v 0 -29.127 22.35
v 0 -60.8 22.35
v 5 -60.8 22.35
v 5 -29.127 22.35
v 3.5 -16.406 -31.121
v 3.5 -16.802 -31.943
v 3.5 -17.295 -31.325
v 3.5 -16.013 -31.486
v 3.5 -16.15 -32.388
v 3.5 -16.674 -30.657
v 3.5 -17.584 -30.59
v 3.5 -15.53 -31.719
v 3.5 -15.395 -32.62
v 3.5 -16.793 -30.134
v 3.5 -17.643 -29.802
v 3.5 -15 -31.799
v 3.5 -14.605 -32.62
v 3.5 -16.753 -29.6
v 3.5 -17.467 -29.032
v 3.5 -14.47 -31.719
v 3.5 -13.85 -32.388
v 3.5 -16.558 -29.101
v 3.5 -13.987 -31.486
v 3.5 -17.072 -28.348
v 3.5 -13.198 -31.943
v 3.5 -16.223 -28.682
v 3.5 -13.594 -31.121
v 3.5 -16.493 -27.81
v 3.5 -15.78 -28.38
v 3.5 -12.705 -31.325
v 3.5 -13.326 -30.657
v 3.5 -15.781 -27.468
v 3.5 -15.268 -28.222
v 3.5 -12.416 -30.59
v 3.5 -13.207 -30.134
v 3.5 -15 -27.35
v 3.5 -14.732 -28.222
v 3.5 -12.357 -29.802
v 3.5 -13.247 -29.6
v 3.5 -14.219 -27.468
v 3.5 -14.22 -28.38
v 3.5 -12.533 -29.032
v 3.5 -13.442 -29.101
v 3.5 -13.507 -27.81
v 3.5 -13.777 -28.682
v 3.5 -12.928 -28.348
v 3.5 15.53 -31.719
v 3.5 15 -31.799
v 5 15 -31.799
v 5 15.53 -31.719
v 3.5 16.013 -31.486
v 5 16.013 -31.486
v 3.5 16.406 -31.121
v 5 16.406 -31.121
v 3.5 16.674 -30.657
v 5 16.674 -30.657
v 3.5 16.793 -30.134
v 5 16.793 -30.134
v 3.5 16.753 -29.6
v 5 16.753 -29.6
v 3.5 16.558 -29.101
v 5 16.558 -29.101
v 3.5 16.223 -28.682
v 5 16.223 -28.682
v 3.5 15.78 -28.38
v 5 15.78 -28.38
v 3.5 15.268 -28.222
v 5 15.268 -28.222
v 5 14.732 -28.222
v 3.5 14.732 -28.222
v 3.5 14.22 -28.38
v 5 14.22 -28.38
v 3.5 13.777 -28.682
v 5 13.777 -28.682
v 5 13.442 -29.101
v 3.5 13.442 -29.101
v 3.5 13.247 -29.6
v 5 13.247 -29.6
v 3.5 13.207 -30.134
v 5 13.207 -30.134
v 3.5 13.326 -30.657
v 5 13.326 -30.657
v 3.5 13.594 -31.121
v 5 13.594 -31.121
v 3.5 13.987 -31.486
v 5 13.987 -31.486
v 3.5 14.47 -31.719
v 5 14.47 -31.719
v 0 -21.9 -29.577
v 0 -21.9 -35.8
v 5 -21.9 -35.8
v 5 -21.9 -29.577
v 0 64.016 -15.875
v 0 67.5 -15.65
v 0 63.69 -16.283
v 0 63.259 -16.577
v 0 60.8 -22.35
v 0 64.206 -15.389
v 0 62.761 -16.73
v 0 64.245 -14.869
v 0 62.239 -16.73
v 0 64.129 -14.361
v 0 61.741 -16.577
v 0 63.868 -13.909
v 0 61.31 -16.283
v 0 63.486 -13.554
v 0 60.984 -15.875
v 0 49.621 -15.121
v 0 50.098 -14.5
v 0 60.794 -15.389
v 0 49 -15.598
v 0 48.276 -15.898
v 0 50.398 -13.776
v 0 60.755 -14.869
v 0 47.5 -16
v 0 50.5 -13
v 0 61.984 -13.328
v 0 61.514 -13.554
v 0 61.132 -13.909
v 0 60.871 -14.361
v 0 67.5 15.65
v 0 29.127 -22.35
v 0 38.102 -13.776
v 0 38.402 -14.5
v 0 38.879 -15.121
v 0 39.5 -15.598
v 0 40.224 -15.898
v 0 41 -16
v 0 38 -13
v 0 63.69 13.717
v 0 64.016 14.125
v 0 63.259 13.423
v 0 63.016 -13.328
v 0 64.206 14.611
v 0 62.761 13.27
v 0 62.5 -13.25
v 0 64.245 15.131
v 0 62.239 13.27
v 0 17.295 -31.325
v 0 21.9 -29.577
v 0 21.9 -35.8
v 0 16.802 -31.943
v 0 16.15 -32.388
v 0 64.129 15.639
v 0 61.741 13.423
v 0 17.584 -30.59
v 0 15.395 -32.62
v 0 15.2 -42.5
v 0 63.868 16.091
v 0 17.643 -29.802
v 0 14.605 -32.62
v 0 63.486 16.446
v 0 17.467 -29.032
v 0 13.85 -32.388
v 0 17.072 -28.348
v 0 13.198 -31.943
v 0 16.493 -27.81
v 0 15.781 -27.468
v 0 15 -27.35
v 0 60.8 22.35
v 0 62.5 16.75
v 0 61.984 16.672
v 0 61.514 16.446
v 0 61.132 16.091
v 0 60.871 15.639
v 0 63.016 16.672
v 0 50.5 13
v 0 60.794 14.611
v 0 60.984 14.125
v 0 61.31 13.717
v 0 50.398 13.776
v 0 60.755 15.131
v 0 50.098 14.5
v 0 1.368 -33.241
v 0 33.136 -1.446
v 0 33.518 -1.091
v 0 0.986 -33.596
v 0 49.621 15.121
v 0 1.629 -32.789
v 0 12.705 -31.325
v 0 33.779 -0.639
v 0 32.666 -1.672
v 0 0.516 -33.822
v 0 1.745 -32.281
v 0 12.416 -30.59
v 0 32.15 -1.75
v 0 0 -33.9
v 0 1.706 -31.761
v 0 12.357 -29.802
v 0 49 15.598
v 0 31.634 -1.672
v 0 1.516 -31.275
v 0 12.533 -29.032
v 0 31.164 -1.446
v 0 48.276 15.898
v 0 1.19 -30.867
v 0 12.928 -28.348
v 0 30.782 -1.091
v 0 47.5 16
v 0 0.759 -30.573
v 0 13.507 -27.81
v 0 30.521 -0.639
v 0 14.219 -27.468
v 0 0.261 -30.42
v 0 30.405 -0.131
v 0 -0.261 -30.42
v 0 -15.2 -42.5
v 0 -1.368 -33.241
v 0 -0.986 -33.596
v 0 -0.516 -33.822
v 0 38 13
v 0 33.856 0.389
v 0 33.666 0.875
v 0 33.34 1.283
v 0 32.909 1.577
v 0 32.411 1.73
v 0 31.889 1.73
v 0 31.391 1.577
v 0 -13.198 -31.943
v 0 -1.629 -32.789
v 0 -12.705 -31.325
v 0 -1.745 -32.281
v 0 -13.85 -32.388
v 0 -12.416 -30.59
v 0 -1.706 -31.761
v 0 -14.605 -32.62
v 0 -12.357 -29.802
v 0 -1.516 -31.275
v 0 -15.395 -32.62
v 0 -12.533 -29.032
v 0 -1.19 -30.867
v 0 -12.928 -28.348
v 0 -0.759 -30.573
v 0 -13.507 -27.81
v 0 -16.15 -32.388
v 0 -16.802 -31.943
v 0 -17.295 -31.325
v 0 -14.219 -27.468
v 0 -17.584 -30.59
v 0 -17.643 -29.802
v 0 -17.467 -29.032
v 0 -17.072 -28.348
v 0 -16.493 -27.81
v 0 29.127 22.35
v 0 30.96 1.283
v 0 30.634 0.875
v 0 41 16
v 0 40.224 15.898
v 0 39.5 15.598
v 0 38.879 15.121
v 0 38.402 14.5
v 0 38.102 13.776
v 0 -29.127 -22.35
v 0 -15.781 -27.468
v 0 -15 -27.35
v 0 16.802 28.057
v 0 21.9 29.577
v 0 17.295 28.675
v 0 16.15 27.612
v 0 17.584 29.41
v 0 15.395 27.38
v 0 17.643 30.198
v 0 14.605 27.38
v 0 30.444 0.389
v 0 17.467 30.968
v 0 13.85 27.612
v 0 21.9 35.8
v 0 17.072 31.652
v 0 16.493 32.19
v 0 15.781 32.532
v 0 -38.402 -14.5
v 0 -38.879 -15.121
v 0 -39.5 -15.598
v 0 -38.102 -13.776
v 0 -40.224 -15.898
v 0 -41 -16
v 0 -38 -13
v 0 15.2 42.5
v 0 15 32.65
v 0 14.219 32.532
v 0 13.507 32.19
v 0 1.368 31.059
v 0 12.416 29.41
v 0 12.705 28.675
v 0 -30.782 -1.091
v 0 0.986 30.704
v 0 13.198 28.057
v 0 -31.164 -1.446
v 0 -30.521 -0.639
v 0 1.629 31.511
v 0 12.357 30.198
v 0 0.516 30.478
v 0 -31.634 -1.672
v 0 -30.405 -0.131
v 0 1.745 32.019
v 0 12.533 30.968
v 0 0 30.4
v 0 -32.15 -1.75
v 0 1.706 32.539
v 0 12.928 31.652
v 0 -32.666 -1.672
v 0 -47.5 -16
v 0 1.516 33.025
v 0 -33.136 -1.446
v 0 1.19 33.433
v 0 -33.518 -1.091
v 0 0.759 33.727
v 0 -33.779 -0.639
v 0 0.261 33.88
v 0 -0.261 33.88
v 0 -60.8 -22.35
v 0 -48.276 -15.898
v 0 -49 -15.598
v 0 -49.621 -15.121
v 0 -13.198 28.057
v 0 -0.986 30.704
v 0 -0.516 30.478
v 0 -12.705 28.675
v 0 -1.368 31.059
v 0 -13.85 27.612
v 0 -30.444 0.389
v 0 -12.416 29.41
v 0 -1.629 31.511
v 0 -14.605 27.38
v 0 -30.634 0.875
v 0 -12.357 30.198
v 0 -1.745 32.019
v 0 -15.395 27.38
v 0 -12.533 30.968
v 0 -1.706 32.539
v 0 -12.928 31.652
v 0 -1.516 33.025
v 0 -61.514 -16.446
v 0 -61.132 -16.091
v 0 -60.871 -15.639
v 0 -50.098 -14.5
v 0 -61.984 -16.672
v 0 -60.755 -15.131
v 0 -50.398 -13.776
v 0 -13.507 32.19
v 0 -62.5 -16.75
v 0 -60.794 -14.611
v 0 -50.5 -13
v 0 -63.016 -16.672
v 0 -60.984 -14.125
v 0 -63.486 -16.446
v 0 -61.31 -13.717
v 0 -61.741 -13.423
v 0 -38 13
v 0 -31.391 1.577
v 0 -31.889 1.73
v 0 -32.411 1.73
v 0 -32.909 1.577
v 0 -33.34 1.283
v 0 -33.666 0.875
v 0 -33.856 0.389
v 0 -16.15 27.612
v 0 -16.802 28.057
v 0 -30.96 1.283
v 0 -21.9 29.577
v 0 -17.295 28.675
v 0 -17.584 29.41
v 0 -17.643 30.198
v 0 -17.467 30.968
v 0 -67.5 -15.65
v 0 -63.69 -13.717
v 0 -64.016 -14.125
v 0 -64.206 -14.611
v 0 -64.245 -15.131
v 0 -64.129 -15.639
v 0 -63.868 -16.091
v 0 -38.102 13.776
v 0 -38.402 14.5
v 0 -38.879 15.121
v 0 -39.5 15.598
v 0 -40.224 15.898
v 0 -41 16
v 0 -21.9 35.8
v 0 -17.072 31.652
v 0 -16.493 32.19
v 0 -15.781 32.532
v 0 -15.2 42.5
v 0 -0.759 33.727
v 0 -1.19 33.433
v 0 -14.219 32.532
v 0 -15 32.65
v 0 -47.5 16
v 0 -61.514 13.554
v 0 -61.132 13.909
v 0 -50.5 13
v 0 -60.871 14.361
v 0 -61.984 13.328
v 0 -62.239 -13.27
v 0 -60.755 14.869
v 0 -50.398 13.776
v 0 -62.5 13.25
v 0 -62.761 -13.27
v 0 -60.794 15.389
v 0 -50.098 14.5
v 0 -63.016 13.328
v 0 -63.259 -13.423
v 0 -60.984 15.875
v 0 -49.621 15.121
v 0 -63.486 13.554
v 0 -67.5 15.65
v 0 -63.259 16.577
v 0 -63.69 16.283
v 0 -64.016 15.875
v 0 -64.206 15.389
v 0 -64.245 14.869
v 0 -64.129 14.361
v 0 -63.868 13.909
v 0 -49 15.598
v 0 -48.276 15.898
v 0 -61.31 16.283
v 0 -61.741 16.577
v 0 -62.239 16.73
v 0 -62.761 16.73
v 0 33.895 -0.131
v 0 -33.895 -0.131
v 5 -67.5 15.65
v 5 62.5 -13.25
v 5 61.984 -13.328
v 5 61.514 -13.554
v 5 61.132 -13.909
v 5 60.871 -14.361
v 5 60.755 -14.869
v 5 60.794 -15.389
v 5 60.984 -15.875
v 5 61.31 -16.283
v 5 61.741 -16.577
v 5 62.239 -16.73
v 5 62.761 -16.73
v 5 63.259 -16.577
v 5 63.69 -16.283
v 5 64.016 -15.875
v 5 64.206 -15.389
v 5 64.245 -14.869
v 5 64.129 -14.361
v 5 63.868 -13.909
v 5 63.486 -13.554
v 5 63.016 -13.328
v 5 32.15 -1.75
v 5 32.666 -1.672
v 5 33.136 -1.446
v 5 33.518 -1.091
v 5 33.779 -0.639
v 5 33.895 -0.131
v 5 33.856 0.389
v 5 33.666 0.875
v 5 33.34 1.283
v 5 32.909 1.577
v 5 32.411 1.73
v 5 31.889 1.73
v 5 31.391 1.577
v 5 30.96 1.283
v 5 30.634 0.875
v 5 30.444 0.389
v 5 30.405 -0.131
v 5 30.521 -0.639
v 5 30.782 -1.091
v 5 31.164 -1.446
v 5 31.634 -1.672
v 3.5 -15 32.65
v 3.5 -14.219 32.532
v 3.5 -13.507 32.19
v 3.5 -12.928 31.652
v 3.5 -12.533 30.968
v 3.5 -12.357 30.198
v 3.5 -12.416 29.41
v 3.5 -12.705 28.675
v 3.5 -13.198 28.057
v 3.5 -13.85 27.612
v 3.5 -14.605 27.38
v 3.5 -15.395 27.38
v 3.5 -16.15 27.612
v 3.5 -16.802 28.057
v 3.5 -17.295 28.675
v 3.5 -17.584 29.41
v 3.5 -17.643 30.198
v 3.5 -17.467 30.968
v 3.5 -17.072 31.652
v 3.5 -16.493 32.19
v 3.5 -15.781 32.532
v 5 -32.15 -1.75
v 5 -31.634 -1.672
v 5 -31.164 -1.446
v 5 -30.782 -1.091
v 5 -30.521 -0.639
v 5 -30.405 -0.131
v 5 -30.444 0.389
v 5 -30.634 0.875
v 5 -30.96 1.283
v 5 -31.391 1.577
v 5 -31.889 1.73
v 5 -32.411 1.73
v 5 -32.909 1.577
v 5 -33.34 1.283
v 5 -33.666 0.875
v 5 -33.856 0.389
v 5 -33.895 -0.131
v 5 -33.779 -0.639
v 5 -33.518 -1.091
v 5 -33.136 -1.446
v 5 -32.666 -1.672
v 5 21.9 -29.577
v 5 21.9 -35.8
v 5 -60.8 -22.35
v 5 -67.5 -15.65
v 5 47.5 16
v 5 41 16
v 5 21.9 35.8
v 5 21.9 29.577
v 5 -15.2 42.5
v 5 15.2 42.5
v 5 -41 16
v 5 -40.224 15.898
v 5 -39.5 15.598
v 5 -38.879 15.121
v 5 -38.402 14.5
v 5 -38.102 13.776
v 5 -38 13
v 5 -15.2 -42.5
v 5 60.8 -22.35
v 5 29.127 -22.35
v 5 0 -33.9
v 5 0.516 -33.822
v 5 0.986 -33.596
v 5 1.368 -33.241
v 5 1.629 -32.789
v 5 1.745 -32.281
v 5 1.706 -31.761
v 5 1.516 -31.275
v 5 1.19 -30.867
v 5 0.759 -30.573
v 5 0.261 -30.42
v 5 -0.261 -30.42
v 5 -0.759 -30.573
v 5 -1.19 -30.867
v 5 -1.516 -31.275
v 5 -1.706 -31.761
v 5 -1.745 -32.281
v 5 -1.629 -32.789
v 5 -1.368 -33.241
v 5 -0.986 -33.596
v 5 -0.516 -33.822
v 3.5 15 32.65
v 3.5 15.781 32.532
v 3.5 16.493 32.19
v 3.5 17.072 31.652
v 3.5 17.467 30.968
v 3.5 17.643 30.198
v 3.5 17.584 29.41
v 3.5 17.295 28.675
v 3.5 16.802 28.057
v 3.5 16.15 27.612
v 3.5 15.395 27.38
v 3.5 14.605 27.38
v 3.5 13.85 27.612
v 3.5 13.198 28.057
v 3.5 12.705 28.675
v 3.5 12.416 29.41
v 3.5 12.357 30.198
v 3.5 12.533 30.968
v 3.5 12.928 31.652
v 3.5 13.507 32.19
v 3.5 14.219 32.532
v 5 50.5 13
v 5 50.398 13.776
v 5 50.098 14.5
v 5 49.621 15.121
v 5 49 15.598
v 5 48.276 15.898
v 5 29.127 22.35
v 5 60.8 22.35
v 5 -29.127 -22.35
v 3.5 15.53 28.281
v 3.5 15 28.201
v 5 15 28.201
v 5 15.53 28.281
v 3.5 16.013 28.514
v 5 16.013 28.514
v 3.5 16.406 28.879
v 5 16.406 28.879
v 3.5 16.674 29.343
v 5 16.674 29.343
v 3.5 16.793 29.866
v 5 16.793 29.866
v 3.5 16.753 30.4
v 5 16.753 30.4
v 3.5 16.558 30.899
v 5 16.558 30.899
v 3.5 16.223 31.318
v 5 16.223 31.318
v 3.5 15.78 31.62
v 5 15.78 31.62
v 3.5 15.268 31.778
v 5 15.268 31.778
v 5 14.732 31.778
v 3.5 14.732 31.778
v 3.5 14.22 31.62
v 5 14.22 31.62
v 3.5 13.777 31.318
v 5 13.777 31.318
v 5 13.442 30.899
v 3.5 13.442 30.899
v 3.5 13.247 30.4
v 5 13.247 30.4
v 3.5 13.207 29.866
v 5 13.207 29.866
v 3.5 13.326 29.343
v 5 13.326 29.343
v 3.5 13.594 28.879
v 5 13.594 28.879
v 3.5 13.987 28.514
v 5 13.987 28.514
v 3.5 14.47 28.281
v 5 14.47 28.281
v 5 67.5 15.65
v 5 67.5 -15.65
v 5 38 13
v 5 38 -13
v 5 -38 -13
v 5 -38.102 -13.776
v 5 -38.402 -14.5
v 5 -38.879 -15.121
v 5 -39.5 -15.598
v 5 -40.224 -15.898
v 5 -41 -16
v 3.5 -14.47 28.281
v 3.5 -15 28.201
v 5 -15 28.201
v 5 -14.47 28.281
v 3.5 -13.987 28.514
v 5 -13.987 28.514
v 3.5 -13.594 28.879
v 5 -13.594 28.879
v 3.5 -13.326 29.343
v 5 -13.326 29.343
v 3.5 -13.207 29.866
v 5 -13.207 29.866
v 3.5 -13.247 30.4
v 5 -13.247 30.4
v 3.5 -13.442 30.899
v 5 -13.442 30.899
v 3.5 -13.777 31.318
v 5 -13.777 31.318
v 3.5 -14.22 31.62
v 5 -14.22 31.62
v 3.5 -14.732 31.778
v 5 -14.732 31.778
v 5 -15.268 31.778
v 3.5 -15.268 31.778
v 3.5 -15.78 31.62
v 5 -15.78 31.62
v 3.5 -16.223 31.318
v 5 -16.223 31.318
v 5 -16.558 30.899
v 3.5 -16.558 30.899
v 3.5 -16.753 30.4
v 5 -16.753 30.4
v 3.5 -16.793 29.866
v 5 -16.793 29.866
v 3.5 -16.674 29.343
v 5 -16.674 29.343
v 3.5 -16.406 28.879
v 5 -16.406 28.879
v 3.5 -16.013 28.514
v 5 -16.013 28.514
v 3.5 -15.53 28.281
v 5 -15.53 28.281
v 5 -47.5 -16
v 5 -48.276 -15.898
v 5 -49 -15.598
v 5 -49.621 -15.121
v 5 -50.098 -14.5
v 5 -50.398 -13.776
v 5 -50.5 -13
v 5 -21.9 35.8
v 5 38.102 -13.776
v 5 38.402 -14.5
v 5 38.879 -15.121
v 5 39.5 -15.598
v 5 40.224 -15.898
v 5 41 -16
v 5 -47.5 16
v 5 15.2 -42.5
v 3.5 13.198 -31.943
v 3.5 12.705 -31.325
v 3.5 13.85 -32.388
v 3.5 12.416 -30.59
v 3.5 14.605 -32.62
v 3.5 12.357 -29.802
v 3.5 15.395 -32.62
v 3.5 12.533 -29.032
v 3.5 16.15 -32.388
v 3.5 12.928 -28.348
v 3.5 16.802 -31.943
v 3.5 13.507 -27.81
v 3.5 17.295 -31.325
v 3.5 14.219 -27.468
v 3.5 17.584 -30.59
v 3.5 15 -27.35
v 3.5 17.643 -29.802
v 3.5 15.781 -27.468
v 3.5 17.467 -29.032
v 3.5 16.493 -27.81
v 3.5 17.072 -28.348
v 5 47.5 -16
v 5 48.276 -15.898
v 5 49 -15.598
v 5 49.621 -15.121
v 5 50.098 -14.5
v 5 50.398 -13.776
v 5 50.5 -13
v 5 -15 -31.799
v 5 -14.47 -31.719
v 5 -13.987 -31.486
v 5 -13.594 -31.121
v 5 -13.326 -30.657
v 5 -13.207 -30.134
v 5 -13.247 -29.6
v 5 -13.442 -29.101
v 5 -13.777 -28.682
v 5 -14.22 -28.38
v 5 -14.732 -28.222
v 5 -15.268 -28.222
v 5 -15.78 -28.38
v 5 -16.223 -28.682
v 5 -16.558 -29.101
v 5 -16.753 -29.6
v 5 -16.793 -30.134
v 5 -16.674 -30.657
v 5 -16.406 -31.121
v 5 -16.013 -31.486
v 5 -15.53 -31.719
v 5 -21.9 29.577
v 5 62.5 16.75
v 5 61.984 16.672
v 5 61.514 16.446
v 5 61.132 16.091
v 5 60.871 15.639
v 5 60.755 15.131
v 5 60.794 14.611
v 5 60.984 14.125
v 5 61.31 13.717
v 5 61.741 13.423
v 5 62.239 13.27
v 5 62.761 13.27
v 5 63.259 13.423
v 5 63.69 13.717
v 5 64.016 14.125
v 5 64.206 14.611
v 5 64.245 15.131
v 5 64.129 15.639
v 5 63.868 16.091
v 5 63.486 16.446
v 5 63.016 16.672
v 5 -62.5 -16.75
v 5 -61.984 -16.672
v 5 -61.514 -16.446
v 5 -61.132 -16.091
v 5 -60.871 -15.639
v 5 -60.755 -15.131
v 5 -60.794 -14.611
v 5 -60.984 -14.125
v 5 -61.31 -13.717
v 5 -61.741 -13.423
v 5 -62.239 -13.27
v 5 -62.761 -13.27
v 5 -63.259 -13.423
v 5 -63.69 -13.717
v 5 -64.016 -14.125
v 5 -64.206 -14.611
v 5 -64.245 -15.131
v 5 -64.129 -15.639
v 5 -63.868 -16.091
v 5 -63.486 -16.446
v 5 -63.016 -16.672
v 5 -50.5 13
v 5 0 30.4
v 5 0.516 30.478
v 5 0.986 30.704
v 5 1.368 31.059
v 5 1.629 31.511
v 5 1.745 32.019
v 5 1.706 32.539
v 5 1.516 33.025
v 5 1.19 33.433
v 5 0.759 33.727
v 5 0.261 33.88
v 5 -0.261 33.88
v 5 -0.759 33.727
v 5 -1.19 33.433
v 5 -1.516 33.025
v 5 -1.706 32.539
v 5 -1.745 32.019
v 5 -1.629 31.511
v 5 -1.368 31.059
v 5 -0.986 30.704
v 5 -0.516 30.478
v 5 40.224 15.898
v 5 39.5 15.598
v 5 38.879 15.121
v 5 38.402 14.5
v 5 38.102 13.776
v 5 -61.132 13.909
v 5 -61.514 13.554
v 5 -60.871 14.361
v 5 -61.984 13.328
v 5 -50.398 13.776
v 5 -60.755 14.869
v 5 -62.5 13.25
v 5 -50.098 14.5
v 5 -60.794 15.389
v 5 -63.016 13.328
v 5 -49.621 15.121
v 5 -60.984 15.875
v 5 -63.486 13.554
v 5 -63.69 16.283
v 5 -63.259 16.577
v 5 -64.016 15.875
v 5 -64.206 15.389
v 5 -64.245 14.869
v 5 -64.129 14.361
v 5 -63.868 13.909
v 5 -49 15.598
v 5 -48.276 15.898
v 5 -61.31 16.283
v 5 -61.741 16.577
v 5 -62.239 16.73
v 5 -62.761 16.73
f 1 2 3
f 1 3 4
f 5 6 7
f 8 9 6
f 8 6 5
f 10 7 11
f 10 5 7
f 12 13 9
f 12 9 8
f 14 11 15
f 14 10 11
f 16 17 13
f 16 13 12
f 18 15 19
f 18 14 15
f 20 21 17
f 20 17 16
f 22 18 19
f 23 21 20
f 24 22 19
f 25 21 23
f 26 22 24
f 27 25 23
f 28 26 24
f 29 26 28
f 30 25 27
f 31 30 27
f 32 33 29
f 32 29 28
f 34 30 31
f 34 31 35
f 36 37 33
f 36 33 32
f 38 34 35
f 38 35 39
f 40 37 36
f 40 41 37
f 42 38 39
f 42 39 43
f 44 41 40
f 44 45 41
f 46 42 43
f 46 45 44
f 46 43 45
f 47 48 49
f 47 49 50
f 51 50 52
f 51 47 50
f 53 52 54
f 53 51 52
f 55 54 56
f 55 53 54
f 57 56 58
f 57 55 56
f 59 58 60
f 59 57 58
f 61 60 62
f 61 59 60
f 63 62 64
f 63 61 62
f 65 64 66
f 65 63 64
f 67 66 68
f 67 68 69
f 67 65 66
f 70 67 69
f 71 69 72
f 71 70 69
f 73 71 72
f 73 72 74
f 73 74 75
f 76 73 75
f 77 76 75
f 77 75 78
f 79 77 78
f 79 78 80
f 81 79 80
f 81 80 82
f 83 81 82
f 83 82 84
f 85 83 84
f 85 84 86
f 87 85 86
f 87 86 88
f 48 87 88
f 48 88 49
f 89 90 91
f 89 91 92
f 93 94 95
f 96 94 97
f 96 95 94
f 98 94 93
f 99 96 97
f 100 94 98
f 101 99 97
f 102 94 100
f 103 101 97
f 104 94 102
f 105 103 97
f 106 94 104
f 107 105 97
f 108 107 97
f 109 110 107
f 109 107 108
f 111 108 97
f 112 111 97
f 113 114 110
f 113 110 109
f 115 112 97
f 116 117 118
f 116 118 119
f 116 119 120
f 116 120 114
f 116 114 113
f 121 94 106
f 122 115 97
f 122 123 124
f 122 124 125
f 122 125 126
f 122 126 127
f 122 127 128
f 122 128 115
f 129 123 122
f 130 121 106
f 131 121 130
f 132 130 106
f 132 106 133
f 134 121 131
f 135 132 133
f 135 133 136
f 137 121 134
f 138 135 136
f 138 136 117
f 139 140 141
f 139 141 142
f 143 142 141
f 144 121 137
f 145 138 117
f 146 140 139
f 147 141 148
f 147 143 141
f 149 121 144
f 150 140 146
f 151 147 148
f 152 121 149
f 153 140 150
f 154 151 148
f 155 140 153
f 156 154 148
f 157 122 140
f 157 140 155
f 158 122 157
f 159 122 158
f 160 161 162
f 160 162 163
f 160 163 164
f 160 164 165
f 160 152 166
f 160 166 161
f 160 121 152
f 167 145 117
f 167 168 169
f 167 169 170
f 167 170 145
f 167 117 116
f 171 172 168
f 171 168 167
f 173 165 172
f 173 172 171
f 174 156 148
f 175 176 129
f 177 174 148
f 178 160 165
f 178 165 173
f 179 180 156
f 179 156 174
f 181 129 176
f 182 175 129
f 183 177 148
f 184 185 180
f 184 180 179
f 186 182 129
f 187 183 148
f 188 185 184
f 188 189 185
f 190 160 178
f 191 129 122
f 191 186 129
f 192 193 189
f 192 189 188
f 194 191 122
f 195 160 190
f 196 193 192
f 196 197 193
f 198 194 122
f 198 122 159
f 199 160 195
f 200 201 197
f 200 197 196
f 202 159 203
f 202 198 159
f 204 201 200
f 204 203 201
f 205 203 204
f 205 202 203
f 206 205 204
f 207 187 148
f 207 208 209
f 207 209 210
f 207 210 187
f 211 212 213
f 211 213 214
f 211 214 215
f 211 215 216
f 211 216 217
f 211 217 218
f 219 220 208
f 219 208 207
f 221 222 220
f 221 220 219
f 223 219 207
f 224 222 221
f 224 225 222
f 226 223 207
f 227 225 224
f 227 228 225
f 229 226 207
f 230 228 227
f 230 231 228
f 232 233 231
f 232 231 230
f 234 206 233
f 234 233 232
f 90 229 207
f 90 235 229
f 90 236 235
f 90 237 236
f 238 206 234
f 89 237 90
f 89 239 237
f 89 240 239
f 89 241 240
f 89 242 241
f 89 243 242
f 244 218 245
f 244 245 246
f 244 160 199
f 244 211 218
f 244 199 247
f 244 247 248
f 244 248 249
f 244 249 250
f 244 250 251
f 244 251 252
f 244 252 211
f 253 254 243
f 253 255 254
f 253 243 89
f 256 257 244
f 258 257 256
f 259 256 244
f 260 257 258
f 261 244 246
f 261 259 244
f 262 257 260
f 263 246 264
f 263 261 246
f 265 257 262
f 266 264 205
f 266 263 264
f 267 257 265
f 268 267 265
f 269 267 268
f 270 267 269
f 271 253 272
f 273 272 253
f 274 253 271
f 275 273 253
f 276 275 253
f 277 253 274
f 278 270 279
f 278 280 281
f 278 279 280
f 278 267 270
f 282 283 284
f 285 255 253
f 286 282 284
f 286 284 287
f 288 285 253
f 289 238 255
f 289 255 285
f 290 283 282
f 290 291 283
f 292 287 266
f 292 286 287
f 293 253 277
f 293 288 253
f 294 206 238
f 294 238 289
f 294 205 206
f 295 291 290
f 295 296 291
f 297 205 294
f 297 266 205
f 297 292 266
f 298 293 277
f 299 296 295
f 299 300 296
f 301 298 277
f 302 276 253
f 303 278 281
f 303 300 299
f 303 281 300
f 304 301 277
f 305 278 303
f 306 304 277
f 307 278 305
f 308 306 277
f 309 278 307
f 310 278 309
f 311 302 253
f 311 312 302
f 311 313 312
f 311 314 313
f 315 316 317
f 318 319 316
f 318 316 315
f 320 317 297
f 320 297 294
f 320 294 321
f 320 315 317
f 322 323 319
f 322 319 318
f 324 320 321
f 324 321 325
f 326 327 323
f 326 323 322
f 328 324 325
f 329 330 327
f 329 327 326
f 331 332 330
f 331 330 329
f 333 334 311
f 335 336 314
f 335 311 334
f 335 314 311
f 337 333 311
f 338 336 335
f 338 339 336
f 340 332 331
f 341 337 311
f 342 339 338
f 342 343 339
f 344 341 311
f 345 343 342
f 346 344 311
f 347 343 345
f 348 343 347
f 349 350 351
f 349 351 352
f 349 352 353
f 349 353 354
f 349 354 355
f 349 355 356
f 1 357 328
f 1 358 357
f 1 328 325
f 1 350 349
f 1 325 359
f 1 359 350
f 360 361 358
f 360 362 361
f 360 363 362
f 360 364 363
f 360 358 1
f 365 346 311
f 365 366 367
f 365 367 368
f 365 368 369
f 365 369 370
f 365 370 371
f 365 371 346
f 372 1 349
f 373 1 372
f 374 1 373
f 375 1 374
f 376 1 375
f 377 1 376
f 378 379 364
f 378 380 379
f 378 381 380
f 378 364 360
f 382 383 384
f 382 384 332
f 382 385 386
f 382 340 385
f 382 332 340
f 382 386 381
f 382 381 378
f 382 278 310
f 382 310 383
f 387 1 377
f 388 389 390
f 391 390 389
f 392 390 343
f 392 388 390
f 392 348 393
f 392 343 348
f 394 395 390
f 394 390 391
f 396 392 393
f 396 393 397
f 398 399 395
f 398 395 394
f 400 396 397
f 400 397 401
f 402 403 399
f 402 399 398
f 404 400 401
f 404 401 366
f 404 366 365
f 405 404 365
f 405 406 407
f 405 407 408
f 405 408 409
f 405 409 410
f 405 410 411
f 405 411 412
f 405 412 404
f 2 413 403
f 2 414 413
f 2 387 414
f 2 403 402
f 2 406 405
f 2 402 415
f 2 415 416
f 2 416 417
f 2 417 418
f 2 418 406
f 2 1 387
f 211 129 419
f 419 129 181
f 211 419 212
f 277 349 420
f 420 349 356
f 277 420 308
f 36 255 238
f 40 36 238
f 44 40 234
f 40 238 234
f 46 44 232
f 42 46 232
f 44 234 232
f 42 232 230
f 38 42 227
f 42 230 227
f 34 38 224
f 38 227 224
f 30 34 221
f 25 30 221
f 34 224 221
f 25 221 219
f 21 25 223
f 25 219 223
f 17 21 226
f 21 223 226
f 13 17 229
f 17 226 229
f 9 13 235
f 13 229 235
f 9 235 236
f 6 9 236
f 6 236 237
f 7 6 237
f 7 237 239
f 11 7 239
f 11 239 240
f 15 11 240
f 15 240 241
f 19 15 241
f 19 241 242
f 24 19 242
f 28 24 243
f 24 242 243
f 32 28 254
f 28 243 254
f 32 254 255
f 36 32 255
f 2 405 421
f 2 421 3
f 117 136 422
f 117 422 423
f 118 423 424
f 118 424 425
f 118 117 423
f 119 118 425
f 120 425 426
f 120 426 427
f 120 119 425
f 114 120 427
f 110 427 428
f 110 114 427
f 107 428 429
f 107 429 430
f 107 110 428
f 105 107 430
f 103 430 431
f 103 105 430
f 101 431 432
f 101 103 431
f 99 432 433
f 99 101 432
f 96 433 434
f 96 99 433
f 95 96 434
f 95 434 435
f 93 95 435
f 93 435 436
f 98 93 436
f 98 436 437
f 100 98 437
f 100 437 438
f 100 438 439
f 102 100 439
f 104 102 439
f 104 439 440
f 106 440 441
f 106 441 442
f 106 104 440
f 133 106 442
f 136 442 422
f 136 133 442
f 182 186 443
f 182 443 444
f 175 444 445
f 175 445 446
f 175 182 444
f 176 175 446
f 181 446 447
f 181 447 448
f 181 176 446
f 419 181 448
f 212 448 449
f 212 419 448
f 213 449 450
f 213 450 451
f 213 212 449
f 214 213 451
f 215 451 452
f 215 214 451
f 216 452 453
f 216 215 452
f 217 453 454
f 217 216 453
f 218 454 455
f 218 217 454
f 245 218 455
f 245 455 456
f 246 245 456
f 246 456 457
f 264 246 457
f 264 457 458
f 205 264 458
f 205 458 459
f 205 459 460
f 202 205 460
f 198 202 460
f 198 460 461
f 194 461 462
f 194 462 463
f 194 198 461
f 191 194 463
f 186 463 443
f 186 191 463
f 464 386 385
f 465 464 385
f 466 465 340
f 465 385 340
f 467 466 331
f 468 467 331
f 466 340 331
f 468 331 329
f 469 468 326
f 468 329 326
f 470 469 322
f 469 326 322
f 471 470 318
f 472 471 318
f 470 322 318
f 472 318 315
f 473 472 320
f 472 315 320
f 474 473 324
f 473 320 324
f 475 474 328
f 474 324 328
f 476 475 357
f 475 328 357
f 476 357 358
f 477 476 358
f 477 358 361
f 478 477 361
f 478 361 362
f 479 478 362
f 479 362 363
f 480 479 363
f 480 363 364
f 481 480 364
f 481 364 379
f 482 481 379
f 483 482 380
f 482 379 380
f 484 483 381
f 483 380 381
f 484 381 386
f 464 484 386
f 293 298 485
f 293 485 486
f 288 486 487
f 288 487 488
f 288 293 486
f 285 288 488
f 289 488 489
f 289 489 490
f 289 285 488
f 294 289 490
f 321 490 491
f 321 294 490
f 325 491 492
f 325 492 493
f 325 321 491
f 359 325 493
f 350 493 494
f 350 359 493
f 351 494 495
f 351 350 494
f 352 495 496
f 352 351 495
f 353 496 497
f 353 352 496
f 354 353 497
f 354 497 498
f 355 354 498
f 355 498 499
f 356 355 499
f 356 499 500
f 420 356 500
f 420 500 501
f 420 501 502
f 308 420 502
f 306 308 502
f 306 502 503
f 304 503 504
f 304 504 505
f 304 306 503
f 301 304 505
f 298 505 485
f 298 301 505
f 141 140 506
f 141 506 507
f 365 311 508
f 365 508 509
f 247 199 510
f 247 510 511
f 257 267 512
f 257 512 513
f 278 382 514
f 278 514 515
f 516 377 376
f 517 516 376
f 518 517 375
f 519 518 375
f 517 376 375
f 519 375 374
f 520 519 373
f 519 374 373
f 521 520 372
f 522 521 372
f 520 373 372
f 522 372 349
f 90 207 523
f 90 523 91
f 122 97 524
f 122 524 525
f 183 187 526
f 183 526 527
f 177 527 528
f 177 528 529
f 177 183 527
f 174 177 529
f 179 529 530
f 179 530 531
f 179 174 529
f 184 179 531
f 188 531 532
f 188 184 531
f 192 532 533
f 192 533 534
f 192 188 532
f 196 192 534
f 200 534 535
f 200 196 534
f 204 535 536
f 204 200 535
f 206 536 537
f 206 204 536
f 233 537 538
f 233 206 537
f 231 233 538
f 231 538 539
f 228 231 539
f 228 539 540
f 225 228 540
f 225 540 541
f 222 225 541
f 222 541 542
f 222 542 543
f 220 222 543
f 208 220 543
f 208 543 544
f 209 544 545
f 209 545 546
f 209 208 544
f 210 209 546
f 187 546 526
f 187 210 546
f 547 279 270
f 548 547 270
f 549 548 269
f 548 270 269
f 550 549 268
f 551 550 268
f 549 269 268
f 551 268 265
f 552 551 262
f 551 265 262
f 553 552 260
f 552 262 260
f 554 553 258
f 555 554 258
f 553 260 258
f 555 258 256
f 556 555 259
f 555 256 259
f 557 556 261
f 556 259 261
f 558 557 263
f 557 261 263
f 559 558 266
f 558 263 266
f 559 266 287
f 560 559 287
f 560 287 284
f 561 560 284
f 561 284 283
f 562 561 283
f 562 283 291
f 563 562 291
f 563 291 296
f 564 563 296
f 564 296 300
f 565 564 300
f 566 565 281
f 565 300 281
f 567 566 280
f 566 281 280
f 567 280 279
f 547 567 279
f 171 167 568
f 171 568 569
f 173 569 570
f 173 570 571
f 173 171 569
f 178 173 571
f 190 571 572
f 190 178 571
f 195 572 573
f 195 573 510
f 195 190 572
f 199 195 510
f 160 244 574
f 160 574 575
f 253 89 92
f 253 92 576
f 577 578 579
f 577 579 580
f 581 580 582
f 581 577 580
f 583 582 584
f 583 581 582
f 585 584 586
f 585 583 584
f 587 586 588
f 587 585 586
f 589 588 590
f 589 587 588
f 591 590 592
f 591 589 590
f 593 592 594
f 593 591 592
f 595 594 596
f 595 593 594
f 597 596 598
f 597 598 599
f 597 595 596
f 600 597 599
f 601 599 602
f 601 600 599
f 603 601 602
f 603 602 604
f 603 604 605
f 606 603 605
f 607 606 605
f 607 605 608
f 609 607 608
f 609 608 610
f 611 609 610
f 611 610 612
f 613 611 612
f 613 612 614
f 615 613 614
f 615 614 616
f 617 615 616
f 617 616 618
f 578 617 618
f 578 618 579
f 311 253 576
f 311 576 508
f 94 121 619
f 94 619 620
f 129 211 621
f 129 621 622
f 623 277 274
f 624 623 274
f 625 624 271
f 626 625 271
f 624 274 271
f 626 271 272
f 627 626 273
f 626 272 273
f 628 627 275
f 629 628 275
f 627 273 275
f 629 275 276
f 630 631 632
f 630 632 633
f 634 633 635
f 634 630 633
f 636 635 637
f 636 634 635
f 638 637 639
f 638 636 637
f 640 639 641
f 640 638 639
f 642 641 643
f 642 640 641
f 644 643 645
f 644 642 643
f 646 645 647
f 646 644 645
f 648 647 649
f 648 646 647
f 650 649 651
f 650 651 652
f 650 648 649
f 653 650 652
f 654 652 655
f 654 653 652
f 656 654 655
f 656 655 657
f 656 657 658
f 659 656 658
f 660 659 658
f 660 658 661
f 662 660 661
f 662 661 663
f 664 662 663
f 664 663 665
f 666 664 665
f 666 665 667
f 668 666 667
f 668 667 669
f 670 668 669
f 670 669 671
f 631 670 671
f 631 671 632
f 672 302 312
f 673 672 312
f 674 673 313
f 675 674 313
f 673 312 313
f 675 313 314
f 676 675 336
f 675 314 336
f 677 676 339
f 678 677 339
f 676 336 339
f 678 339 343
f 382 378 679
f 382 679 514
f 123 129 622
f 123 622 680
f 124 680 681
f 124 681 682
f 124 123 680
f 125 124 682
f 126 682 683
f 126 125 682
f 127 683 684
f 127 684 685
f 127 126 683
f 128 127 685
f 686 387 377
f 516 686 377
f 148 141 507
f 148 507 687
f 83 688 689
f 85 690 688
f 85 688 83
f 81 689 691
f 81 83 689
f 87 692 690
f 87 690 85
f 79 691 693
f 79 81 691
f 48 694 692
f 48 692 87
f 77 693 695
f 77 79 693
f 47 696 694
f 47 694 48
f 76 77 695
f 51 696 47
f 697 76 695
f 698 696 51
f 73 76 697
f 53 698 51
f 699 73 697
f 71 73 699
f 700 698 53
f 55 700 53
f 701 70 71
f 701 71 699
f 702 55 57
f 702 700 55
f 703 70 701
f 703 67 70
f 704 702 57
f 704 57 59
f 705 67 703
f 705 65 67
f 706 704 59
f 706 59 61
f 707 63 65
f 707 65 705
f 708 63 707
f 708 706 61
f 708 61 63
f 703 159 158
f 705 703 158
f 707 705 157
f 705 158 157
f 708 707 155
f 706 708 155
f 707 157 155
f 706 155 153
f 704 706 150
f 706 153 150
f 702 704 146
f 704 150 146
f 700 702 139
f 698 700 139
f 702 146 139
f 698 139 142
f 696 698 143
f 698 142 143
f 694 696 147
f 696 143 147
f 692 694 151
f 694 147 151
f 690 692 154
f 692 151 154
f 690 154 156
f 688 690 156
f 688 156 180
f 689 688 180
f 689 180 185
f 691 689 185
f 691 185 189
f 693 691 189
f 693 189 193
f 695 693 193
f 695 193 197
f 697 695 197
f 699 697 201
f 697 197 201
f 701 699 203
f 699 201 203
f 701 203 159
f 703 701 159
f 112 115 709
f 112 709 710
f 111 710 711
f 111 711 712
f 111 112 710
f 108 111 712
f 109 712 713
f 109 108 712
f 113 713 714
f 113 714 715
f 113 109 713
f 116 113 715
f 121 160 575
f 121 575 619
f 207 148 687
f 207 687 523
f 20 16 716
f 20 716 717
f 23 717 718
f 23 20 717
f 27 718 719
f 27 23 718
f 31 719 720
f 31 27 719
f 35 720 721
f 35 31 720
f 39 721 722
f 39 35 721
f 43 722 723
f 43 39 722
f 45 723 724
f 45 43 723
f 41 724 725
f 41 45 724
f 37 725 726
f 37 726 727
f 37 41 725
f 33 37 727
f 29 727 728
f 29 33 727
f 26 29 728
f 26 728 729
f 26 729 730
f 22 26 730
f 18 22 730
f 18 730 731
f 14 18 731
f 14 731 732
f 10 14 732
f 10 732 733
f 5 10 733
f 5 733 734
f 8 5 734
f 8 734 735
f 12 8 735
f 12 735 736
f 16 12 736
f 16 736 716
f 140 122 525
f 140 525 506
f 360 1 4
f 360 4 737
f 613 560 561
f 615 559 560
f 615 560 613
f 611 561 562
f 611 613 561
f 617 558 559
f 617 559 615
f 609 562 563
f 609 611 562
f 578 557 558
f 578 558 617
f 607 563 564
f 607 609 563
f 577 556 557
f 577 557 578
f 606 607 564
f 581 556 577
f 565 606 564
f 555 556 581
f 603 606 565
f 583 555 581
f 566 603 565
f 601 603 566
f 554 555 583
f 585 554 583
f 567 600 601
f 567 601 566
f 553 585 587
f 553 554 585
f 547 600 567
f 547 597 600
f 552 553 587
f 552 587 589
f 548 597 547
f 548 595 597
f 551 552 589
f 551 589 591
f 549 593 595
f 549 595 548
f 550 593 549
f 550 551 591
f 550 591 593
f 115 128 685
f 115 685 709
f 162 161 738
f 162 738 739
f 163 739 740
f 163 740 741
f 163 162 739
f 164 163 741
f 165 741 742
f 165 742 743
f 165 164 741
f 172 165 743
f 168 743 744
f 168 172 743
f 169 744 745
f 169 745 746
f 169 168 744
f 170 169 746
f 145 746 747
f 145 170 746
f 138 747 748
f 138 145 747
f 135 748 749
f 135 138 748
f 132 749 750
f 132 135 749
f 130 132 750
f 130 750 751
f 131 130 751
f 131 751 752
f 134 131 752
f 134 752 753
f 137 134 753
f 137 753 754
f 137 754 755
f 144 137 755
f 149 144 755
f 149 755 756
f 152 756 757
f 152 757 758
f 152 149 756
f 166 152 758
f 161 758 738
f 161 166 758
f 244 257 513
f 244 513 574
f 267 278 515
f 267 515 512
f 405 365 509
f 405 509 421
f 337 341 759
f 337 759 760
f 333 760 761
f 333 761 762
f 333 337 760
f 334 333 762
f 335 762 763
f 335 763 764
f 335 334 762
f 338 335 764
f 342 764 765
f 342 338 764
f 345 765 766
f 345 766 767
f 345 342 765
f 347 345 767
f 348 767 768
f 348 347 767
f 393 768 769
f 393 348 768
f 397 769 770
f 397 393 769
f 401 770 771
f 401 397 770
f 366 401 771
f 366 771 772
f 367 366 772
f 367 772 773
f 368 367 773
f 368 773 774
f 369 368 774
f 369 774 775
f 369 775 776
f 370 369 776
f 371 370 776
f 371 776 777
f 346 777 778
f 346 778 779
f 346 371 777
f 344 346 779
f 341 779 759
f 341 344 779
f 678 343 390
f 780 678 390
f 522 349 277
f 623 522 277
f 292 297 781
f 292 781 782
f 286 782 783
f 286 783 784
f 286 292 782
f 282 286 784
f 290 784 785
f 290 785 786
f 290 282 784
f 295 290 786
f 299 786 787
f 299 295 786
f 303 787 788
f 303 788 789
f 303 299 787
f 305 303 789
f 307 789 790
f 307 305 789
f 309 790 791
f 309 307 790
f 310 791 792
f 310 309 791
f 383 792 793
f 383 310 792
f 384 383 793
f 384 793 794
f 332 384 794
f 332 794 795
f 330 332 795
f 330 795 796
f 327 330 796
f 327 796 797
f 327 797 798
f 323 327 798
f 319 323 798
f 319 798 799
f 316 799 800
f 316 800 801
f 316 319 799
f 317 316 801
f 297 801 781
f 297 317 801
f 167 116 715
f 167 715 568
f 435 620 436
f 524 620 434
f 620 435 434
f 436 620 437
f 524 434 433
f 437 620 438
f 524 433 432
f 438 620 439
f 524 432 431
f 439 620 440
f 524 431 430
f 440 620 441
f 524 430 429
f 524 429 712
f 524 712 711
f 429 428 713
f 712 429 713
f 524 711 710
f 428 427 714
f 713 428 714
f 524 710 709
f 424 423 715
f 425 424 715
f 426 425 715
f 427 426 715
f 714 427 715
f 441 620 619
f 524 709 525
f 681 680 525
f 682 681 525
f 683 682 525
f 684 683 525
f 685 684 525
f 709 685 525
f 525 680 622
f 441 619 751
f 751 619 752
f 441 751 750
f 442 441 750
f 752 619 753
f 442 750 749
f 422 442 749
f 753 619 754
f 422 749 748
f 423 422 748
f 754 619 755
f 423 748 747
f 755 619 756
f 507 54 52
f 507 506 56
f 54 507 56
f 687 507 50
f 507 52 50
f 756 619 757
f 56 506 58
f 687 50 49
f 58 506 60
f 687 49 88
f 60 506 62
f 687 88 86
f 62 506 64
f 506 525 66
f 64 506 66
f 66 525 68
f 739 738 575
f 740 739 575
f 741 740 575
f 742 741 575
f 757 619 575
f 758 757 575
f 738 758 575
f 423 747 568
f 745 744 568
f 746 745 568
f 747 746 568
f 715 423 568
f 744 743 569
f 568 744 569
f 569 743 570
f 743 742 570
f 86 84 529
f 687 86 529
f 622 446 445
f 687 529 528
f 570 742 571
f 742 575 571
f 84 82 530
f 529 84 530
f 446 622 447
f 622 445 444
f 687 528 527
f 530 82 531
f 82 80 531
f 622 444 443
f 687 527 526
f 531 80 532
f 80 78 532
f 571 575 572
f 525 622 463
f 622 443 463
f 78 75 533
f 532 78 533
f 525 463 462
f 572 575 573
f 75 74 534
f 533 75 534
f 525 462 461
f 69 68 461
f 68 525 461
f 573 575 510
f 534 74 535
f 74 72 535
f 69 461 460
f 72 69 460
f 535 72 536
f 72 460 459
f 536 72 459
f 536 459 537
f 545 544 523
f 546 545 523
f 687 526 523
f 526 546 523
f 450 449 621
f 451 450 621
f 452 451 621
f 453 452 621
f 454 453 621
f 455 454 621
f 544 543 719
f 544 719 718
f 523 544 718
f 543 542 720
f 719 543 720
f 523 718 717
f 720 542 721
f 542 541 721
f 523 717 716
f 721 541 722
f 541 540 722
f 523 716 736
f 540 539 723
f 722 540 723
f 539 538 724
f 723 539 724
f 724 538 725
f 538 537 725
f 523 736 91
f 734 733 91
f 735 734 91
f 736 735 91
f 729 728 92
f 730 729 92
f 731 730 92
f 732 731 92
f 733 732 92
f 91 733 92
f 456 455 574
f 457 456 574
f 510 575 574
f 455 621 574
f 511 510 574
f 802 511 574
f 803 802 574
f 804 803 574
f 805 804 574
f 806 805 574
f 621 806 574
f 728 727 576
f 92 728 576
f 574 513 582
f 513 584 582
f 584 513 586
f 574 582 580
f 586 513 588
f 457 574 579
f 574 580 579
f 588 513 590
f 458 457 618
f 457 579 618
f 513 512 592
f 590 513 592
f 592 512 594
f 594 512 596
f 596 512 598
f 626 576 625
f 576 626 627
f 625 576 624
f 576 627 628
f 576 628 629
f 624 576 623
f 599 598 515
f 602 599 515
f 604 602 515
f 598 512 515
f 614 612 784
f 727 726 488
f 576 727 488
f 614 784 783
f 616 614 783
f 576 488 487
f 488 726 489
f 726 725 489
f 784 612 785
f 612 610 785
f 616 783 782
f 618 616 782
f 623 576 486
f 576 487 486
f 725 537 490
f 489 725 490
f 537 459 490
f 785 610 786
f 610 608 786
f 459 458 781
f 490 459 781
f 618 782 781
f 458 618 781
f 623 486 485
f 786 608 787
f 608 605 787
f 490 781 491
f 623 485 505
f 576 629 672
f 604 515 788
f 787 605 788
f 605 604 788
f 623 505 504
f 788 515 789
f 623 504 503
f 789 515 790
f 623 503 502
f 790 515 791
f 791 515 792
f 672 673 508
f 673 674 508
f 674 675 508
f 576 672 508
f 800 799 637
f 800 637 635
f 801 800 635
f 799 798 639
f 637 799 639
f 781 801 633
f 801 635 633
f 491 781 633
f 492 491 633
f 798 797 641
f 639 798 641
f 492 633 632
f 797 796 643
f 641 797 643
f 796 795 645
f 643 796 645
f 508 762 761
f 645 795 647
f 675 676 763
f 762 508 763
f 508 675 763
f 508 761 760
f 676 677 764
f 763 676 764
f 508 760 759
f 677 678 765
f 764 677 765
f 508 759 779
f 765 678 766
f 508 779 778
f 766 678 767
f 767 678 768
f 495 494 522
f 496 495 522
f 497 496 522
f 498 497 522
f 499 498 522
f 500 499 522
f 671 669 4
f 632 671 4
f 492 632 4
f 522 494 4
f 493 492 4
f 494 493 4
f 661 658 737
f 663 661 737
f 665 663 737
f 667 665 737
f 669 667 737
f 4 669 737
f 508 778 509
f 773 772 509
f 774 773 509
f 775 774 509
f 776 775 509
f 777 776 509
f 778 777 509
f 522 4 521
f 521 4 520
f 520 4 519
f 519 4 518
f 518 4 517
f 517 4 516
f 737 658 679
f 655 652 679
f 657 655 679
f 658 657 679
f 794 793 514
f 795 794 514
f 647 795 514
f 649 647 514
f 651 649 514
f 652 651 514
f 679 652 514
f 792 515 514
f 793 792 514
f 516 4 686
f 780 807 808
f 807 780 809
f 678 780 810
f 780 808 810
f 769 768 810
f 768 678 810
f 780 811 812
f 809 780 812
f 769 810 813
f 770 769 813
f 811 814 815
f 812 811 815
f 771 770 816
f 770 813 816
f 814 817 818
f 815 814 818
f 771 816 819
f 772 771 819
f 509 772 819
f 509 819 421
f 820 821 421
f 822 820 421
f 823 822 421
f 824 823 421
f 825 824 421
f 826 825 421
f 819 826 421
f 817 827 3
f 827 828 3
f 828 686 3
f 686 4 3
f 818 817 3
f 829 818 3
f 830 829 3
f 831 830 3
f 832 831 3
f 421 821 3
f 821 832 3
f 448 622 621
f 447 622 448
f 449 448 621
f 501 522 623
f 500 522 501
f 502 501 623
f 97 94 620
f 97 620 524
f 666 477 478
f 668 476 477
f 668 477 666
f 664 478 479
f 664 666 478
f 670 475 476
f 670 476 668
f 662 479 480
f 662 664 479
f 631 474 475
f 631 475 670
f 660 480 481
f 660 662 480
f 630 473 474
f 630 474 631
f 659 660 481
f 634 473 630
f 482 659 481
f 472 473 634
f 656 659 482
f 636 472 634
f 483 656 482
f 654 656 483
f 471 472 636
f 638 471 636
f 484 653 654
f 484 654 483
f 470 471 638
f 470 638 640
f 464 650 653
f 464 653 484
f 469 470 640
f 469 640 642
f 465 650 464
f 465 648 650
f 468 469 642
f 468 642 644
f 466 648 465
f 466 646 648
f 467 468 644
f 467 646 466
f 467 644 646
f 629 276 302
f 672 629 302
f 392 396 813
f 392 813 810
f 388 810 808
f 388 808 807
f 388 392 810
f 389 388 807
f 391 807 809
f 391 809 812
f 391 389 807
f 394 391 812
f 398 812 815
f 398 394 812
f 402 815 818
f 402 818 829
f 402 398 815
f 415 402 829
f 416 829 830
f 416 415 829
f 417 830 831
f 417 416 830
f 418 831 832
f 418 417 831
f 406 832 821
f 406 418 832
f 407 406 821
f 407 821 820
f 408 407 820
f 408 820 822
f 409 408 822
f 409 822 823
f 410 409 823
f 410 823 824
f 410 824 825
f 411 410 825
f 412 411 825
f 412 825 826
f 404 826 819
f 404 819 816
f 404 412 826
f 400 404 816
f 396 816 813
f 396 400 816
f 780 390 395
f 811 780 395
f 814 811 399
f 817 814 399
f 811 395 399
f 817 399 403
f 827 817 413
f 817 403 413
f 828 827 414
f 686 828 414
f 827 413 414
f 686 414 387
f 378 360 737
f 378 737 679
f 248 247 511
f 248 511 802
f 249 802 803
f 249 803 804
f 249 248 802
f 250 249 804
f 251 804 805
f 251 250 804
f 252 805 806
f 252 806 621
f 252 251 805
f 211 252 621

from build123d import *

# Parameters (mm, degrees)
SKETCH1_R           = 1.75
SKETCH1_R_2         = 1.798521792
BOSS_EXTRUDE1_DEPTH = 5
SKETCH2_R           = 2.65
CUT_EXTRUDE1_DEPTH  = 3.5


with BuildPart() as part:
    # Sketch1 → Boss-Extrude1 (new body)
    with BuildSketch(Plane.YZ):
        Polygon((-67.5, -15.65), (-67.5, 15.65), (-60.8, 22.35), (-29.12737367, 22.35), (-21.9, 29.57737367), (-21.9, 35.8), (-15.2, 42.5), (15.2, 42.5), (21.9, 35.8), (21.9, 29.57737367), (29.12737367, 22.35), (60.8, 22.35), (67.5, 15.65), (67.5, -15.65), (60.8, -22.35), (29.12737367, -22.35), (21.9, -29.57737367), (21.9, -35.8), (15.2, -42.5), (-15.2, -42.5), (-21.9, -35.8), (-21.9, -29.57737367), (-29.12737367, -22.35), (-60.8, -22.35), align=None)
        with Locations(Location((0, 32.15, 0), (0, 0, 270))):
            Circle(SKETCH1_R, mode=Mode.SUBTRACT)
        with Locations(Location((-32.15, 0, 0), (0, 0, 270))):
            Circle(SKETCH1_R, mode=Mode.SUBTRACT)
        with Locations(Location((0, -32.15, 0), (0, 0, 270))):
            Circle(SKETCH1_R, mode=Mode.SUBTRACT)
        with Locations(Location((32.15, 0, 0), (0, 0, 270))):
            Circle(SKETCH1_R, mode=Mode.SUBTRACT)
        with Locations(Location((-62.5, -15, 0), (0, 0, 270))):
            Circle(SKETCH1_R, mode=Mode.SUBTRACT)
        with Locations(Location((-62.5, 15, 0), (0, 0, 270))):
            Circle(SKETCH1_R, mode=Mode.SUBTRACT)
        with Locations(Location((62.5, -15, 0), (0, 0, 90))):
            Circle(SKETCH1_R, mode=Mode.SUBTRACT)
        with Locations(Location((62.5, 15, 0), (0, 0, 90))):
            Circle(SKETCH1_R, mode=Mode.SUBTRACT)
        with Locations(Location((-15, 30, 0), (0, 0, 270))):
            Circle(SKETCH1_R_2, mode=Mode.SUBTRACT)
        with Locations(Location((15, 30, 0), (0, 0, 270))):
            Circle(SKETCH1_R_2, mode=Mode.SUBTRACT)
        with Locations(Location((15, -30, 0), (0, 0, 270))):
            Circle(SKETCH1_R_2, mode=Mode.SUBTRACT)
        with Locations(Location((-15, -30, 0), (0, 0, 270))):
            Circle(SKETCH1_R_2, mode=Mode.SUBTRACT)
        with BuildLine():
            Line((41, -16), (47.5, -16))
            ThreePointArc((47.5, -16), (49.621320344, -15.121320344), (50.5, -13))
            Line((50.5, -13), (50.5, 13))
            ThreePointArc((50.5, 13), (49.621320344, 15.121320344), (47.5, 16))
            Line((47.5, 16), (41, 16))
            ThreePointArc((41, 16), (38.878679656, 15.121320344), (38, 13))
            Line((38, 13), (38, -13))
            ThreePointArc((38, -13), (38.878679656, -15.121320344), (41, -16))
        make_face(mode=Mode.SUBTRACT)
        with BuildLine():
            Line((-41, -16), (-47.5, -16))
            ThreePointArc((-47.5, -16), (-49.621320344, -15.121320344), (-50.5, -13))
            Line((-50.5, -13), (-50.5, 13))
            ThreePointArc((-50.5, 13), (-49.621320344, 15.121320344), (-47.5, 16))
            Line((-47.5, 16), (-41, 16))
            ThreePointArc((-41, 16), (-38.878679656, 15.121320344), (-38, 13))
            Line((-38, 13), (-38, -13))
            ThreePointArc((-38, -13), (-38.878679656, -15.121320344), (-41, -16))
        make_face(mode=Mode.SUBTRACT)
    extrude(amount=BOSS_EXTRUDE1_DEPTH)

    # Sketch2 → Cut-Extrude1 (cut)
    with BuildSketch(Plane(origin=(0, 0, 0), x_dir=(0, -1, 0), z_dir=(-1, 0, 0))):
        with Locations(Location((-15, 30, 0), (0, 0, 90))):
            Circle(SKETCH2_R)
        with Locations(Location((15, 30, 0), (0, 0, 90))):
            Circle(SKETCH2_R)
        with Locations(Location((15, -30, 0), (0, 0, 90))):
            Circle(SKETCH2_R)
        with Locations(Location((-15, -30, 0), (0, 0, 90))):
            Circle(SKETCH2_R)
    extrude(amount=-CUT_EXTRUDE1_DEPTH, mode=Mode.SUBTRACT)


solid = part.part
